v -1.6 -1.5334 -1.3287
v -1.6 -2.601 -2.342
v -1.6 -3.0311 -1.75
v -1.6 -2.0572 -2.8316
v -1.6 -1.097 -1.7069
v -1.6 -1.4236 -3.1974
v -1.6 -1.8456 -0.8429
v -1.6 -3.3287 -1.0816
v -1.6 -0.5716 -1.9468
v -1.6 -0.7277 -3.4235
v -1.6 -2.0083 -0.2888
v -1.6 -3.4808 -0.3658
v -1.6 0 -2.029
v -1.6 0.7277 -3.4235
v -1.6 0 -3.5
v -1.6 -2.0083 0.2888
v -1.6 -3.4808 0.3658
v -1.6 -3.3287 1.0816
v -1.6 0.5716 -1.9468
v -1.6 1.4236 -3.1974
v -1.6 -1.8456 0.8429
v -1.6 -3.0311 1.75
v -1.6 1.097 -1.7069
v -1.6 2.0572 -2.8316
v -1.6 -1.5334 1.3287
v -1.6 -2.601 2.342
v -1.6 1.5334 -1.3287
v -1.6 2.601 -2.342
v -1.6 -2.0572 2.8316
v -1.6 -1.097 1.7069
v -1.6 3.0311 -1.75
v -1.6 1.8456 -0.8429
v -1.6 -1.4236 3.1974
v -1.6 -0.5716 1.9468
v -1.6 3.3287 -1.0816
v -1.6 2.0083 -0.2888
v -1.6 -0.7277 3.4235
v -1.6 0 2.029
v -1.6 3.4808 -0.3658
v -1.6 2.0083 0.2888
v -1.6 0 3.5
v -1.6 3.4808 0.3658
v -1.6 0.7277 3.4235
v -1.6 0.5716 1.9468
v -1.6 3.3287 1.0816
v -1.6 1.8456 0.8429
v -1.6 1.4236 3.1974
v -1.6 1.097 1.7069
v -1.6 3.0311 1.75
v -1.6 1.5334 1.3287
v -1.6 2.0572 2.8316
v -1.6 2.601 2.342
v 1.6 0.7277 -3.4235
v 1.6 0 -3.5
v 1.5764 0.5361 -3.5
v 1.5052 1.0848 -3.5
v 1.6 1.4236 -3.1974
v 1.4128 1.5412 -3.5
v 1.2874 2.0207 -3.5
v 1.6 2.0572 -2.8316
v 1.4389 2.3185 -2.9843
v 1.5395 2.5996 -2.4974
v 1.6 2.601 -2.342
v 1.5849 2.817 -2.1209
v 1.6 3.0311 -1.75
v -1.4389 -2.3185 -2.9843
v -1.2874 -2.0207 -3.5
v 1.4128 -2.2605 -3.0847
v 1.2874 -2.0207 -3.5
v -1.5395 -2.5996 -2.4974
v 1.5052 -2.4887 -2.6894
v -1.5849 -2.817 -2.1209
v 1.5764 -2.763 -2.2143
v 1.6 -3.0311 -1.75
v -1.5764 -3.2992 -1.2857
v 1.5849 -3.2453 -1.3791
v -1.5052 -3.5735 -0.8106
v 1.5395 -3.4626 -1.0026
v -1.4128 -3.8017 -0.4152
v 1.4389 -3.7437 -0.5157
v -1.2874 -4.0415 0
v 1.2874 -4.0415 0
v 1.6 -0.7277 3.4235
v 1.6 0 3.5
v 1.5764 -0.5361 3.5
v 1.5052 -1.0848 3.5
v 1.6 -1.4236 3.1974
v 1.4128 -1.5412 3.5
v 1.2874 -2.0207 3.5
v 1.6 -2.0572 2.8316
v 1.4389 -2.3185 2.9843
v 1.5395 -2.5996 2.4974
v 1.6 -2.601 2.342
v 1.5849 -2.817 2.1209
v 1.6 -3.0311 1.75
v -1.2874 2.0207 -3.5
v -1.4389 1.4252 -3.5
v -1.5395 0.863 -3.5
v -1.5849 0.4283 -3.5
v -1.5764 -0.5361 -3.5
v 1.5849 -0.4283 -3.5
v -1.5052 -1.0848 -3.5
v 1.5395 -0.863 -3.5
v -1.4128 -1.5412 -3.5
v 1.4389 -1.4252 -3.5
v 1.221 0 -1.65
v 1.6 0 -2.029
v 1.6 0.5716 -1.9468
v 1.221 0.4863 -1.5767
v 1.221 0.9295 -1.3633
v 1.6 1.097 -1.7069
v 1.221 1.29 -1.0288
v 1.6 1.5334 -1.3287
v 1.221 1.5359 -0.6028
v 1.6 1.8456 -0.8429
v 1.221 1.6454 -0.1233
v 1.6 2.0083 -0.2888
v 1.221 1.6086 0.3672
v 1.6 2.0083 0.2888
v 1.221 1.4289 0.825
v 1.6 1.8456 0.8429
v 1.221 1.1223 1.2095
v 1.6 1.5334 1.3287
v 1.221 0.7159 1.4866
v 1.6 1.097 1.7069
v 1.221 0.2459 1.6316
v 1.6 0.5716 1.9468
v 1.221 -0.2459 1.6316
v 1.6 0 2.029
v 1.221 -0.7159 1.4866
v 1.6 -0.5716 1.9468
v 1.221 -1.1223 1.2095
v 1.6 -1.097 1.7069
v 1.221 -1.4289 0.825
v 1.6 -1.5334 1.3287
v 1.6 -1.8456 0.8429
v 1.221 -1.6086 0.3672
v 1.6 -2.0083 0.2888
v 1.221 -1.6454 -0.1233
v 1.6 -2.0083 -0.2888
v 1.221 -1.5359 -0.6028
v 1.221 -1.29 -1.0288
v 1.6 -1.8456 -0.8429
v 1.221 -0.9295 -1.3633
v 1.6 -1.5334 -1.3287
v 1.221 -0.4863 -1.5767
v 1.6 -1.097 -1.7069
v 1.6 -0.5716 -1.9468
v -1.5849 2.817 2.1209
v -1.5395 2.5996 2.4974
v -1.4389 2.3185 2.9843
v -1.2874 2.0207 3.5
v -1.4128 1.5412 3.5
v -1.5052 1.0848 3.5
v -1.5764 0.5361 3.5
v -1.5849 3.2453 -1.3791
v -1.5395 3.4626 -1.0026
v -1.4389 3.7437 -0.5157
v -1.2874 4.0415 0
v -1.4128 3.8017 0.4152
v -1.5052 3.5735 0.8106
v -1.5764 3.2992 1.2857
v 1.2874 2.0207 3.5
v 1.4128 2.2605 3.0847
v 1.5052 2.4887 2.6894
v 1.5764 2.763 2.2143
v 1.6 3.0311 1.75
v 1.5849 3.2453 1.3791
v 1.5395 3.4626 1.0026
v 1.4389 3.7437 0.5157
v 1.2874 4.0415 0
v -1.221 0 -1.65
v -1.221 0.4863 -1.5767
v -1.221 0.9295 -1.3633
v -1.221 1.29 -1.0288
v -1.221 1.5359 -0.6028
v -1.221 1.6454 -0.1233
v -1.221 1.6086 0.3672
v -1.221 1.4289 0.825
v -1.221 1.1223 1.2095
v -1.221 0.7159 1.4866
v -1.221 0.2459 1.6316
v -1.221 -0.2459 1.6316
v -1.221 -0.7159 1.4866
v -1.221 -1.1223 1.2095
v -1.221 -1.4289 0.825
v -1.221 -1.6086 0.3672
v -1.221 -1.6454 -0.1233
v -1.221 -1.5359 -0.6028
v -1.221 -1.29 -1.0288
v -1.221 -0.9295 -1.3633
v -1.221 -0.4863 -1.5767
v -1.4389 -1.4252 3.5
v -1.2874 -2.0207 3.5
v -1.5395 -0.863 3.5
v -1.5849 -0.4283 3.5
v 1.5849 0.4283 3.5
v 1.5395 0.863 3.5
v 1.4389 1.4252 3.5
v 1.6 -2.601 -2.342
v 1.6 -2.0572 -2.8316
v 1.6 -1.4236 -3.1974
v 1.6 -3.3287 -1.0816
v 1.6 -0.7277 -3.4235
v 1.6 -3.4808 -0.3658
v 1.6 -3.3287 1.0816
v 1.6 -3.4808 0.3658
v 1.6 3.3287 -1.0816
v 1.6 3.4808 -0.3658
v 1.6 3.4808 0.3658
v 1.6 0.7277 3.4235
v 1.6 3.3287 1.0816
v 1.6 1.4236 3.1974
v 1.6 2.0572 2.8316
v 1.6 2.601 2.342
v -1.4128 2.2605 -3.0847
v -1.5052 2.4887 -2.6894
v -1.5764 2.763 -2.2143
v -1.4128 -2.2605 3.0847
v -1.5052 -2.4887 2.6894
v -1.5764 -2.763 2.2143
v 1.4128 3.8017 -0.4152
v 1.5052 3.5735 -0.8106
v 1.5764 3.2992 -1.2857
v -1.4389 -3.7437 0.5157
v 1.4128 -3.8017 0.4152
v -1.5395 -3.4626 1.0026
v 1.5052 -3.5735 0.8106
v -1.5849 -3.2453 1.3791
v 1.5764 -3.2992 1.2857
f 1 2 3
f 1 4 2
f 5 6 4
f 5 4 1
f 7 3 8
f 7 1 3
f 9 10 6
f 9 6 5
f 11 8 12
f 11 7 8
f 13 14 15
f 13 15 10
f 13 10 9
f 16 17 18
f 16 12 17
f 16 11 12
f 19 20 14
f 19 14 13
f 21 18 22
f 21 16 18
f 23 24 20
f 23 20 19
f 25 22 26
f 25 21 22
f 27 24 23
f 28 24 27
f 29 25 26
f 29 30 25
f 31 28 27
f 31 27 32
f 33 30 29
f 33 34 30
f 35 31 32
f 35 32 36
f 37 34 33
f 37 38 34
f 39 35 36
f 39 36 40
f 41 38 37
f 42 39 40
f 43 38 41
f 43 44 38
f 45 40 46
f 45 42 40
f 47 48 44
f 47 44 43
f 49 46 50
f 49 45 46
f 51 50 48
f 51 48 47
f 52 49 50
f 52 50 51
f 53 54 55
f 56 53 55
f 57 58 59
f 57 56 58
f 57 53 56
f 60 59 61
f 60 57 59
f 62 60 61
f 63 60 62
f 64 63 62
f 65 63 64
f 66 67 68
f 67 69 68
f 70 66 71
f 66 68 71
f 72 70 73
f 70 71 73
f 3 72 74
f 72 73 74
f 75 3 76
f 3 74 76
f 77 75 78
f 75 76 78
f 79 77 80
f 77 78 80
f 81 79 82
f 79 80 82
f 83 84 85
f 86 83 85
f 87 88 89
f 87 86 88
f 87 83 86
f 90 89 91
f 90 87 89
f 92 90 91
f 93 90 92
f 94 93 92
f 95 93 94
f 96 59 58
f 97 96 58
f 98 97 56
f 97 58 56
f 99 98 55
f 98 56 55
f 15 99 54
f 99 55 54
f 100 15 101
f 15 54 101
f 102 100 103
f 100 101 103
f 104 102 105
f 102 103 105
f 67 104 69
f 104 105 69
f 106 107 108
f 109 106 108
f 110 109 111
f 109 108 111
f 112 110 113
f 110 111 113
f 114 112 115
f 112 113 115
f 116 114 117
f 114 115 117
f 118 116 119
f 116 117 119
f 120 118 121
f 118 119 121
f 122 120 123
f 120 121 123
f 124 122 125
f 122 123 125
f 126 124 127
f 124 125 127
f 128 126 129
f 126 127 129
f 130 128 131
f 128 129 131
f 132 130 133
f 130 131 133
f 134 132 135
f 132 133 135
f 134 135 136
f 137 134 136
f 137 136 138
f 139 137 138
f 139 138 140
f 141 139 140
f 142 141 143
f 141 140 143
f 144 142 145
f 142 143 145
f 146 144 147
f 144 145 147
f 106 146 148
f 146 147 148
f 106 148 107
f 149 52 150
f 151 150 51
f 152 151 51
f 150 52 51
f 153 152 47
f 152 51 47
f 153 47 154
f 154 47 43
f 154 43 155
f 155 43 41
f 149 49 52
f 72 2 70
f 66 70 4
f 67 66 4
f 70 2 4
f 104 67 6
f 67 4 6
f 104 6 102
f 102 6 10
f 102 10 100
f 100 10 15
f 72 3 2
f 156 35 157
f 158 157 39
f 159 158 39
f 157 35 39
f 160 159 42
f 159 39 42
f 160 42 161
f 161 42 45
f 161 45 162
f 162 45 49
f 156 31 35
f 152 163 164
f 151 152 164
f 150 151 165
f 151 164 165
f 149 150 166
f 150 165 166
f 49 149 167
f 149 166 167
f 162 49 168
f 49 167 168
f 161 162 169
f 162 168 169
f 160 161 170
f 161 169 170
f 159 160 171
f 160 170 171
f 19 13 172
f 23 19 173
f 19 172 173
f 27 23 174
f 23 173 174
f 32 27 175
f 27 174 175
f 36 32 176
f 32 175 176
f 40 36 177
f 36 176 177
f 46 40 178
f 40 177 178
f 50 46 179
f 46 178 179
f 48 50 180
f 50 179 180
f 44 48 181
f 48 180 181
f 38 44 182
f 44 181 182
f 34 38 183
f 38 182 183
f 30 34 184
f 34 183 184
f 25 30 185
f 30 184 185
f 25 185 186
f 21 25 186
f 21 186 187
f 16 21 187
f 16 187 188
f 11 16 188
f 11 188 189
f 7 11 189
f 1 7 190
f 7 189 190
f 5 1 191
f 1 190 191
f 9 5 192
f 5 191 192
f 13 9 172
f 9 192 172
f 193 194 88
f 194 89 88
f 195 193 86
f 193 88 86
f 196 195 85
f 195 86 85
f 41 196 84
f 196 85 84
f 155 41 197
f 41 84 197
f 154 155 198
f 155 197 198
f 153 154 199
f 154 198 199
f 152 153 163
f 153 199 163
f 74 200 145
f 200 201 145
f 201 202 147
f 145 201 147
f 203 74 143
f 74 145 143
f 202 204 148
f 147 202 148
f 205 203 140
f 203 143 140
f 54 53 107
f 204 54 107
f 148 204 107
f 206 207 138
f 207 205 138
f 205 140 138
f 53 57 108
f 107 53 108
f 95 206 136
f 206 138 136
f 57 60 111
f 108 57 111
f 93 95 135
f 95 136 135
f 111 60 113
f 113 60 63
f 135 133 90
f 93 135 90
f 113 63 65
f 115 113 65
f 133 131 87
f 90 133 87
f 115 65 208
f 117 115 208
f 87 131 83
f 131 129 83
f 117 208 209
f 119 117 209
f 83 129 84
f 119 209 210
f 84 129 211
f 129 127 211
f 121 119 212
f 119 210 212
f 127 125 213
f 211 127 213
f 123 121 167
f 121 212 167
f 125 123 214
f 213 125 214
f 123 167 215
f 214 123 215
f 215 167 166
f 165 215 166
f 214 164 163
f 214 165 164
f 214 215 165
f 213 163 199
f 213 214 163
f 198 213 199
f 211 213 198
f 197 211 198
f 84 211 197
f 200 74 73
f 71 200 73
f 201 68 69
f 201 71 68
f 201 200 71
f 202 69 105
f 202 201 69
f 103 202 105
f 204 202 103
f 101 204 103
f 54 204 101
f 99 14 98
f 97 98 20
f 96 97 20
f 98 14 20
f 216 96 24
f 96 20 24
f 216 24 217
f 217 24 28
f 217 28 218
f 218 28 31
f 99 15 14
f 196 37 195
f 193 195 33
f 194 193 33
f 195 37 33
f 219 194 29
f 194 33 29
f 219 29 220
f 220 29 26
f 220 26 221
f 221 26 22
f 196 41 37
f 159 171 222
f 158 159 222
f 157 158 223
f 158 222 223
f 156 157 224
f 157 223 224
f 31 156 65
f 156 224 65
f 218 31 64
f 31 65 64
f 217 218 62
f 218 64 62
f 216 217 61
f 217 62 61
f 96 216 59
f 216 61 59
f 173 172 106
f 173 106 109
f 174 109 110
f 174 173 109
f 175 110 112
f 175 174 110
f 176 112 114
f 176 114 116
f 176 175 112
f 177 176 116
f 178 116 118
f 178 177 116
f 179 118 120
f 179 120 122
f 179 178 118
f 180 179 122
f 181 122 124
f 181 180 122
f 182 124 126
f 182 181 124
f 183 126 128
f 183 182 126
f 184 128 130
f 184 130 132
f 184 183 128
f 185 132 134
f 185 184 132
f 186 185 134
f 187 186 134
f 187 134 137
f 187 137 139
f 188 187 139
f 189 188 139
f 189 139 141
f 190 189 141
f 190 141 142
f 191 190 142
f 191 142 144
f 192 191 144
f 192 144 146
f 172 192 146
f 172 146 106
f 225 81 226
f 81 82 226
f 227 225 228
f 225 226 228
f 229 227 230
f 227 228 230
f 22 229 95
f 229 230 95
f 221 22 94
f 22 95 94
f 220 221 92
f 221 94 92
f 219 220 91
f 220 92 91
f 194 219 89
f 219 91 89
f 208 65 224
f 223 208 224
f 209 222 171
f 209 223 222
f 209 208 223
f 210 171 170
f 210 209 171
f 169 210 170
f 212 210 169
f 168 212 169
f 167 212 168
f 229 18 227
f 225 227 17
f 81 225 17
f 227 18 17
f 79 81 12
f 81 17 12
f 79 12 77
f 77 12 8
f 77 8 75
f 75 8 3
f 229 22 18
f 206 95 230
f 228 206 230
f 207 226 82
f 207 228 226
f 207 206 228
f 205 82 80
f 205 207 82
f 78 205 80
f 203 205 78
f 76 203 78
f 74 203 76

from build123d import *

# Parameters (mm, degrees)
SKETCH1_R           = 1.65
BOSS_EXTRUDE1_DEPTH = 1.6
CHAMFER1_SIZE       = 0.379


with BuildPart() as part:
    # Sketch1 → Boss-Extrude1 (new, symmetric)
    with BuildSketch(Plane(origin=(0, 0, 0), x_dir=(0, 0, -1), z_dir=(1, 0, 0))):
        Polygon((3.5, 2.020725942), (3.5, -2.020725942), (0, -4.041451884), (-3.5, -2.020725942), (-3.5, 2.020725942), (0, 4.041451884), align=None)
        Circle(SKETCH1_R, mode=Mode.SUBTRACT)
    extrude(amount=BOSS_EXTRUDE1_DEPTH, both=True)

    # Sketch4 → Cut-Revolve1 (revolve, cut)
    with BuildSketch(Plane.XY):
        Polygon((-1.6, 3.5), (-1.6, 5.227530151), (-0.602610002, 5.227530151), align=None)
    cut_revolve1 = revolve(axis=Axis((-2.7190736, 0, 0), (1, 0, 0)), mode=Mode.SUBTRACT)

    # Mirror1: Cut-Revolve1 across plane
    add(cut_revolve1.mirror(Plane(origin=(0, 0, 0), x_dir=(0, 0, 1), z_dir=(1, 0, 0))), mode=Mode.SUBTRACT)

    # Chamfer1
    chamfer1_edges = [part.edges().sort_by_distance(p)[0] for p in [
        (-1.6, 0, 1.65),
        (1.6, 0, 1.65),
    ]]
    chamfer(chamfer1_edges, length=CHAMFER1_SIZE)


solid = part.part
